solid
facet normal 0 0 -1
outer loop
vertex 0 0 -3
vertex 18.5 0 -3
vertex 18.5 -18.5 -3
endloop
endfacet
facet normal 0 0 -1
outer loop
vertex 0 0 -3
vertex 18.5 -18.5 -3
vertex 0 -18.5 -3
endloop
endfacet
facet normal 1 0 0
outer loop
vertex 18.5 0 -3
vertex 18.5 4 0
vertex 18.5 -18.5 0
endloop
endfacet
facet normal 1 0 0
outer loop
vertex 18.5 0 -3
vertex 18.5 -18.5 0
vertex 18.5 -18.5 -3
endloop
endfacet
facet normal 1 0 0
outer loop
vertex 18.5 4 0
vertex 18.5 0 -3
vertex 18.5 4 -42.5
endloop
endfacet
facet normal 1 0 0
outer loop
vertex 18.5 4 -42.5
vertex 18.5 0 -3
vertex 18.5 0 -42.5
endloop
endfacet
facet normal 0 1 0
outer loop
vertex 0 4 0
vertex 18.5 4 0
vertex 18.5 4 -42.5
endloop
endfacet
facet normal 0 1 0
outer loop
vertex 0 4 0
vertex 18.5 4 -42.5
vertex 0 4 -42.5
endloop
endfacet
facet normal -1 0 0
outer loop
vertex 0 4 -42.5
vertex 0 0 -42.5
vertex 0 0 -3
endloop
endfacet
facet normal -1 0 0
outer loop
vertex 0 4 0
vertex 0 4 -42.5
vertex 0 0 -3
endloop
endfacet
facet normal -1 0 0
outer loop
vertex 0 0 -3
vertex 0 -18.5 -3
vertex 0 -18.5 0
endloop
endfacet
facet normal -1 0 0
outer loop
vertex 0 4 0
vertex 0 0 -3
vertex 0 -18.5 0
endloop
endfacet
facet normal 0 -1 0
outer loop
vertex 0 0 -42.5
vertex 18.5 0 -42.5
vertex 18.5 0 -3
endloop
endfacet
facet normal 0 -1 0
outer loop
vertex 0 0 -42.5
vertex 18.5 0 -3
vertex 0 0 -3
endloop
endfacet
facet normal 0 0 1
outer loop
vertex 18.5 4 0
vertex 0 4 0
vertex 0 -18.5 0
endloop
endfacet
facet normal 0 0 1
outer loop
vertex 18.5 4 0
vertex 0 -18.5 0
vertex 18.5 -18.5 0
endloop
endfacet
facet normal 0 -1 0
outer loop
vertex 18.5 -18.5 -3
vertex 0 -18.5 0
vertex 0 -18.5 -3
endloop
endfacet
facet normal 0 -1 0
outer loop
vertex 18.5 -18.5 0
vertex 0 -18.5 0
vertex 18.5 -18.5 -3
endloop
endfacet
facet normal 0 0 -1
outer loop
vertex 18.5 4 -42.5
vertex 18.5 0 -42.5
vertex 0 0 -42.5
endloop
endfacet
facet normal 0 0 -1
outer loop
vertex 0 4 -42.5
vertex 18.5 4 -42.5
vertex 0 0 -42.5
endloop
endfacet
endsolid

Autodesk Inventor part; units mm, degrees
ref_plane "YZ Plane" through (0, 0, 0) normal (1, 0, 0) x (0, 1, 0)
ref_plane "XZ Plane" through (0, 0, 0) normal (0, 1, 0) x (-1, 0, 0)
ref_plane "XY Plane" through (0, 0, 0) normal (0, 0, 1) x (1, 0, 0)
sketch "Sketch1" plane through (0, 0, 0) normal (0, 1, 0) x (-1, 0, 0)
  line L0 (0, 0) -> (-18.5, 0)
  line L1 (-18.5, 0) -> (-18.5, -42.5)
  line L2 (-18.5, -42.5) -> (0, -42.5)
  line L3 (0, -42.5) -> (0, 0)
  dimension "d0" = 18.5
  dimension "d1" = 42.5
extrude "Extrusion1" add sketch "Sketch1" along normal blind 4
sketch "Sketch2" plane through (0, 0, 0) normal (0, -1, 0) x (1, 0, 0)
  line L0 (0, -42.5) -> (0, 0) projected
  line L1 (18.5, 0) -> (18.5, -42.5) projected
  line L2 (0, 0) -> (18.5, 0)
  line L3 (18.5, 0) -> (18.5, -3)
  line L4 (18.5, -3) -> (0, -3)
  line L5 (0, -3) -> (0, 0)
  dimension "d4" = 3
extrude "Extrusion2" add sketch "Sketch2" along normal blind 18.5
sketch "Sketch3" plane through (0, 4, 0) normal (0, 1, 0) x (1, 0, 0)
  line L0 (1.2509, 3.5794) -> (17.7774, 3.5794) construction
  line L1 (17.7774, 3.5794) -> (17.7774, 0.9324) construction
  line L2 (17.7774, 0.9324) -> (1.2509, 0.9324) construction
  line L3 (1.2509, 0.9324) -> (1.2509, 3.5794) construction
  line L4 (7.0482, 14.2862) -> (7.0482, 39.4285) construction
  line L5 (7.0482, 39.4285) -> (10.2049, 39.4285) construction
  line L6 (10.2049, 39.4285) -> (10.2049, 14.2862) construction
  line L7 (10.2049, 14.2862) -> (7.0482, 14.2862) construction
  point P0 (0, 0)
  dimension "d2" = 4
  dimension "d3" = 0
properties part number "controller_reveiver"
